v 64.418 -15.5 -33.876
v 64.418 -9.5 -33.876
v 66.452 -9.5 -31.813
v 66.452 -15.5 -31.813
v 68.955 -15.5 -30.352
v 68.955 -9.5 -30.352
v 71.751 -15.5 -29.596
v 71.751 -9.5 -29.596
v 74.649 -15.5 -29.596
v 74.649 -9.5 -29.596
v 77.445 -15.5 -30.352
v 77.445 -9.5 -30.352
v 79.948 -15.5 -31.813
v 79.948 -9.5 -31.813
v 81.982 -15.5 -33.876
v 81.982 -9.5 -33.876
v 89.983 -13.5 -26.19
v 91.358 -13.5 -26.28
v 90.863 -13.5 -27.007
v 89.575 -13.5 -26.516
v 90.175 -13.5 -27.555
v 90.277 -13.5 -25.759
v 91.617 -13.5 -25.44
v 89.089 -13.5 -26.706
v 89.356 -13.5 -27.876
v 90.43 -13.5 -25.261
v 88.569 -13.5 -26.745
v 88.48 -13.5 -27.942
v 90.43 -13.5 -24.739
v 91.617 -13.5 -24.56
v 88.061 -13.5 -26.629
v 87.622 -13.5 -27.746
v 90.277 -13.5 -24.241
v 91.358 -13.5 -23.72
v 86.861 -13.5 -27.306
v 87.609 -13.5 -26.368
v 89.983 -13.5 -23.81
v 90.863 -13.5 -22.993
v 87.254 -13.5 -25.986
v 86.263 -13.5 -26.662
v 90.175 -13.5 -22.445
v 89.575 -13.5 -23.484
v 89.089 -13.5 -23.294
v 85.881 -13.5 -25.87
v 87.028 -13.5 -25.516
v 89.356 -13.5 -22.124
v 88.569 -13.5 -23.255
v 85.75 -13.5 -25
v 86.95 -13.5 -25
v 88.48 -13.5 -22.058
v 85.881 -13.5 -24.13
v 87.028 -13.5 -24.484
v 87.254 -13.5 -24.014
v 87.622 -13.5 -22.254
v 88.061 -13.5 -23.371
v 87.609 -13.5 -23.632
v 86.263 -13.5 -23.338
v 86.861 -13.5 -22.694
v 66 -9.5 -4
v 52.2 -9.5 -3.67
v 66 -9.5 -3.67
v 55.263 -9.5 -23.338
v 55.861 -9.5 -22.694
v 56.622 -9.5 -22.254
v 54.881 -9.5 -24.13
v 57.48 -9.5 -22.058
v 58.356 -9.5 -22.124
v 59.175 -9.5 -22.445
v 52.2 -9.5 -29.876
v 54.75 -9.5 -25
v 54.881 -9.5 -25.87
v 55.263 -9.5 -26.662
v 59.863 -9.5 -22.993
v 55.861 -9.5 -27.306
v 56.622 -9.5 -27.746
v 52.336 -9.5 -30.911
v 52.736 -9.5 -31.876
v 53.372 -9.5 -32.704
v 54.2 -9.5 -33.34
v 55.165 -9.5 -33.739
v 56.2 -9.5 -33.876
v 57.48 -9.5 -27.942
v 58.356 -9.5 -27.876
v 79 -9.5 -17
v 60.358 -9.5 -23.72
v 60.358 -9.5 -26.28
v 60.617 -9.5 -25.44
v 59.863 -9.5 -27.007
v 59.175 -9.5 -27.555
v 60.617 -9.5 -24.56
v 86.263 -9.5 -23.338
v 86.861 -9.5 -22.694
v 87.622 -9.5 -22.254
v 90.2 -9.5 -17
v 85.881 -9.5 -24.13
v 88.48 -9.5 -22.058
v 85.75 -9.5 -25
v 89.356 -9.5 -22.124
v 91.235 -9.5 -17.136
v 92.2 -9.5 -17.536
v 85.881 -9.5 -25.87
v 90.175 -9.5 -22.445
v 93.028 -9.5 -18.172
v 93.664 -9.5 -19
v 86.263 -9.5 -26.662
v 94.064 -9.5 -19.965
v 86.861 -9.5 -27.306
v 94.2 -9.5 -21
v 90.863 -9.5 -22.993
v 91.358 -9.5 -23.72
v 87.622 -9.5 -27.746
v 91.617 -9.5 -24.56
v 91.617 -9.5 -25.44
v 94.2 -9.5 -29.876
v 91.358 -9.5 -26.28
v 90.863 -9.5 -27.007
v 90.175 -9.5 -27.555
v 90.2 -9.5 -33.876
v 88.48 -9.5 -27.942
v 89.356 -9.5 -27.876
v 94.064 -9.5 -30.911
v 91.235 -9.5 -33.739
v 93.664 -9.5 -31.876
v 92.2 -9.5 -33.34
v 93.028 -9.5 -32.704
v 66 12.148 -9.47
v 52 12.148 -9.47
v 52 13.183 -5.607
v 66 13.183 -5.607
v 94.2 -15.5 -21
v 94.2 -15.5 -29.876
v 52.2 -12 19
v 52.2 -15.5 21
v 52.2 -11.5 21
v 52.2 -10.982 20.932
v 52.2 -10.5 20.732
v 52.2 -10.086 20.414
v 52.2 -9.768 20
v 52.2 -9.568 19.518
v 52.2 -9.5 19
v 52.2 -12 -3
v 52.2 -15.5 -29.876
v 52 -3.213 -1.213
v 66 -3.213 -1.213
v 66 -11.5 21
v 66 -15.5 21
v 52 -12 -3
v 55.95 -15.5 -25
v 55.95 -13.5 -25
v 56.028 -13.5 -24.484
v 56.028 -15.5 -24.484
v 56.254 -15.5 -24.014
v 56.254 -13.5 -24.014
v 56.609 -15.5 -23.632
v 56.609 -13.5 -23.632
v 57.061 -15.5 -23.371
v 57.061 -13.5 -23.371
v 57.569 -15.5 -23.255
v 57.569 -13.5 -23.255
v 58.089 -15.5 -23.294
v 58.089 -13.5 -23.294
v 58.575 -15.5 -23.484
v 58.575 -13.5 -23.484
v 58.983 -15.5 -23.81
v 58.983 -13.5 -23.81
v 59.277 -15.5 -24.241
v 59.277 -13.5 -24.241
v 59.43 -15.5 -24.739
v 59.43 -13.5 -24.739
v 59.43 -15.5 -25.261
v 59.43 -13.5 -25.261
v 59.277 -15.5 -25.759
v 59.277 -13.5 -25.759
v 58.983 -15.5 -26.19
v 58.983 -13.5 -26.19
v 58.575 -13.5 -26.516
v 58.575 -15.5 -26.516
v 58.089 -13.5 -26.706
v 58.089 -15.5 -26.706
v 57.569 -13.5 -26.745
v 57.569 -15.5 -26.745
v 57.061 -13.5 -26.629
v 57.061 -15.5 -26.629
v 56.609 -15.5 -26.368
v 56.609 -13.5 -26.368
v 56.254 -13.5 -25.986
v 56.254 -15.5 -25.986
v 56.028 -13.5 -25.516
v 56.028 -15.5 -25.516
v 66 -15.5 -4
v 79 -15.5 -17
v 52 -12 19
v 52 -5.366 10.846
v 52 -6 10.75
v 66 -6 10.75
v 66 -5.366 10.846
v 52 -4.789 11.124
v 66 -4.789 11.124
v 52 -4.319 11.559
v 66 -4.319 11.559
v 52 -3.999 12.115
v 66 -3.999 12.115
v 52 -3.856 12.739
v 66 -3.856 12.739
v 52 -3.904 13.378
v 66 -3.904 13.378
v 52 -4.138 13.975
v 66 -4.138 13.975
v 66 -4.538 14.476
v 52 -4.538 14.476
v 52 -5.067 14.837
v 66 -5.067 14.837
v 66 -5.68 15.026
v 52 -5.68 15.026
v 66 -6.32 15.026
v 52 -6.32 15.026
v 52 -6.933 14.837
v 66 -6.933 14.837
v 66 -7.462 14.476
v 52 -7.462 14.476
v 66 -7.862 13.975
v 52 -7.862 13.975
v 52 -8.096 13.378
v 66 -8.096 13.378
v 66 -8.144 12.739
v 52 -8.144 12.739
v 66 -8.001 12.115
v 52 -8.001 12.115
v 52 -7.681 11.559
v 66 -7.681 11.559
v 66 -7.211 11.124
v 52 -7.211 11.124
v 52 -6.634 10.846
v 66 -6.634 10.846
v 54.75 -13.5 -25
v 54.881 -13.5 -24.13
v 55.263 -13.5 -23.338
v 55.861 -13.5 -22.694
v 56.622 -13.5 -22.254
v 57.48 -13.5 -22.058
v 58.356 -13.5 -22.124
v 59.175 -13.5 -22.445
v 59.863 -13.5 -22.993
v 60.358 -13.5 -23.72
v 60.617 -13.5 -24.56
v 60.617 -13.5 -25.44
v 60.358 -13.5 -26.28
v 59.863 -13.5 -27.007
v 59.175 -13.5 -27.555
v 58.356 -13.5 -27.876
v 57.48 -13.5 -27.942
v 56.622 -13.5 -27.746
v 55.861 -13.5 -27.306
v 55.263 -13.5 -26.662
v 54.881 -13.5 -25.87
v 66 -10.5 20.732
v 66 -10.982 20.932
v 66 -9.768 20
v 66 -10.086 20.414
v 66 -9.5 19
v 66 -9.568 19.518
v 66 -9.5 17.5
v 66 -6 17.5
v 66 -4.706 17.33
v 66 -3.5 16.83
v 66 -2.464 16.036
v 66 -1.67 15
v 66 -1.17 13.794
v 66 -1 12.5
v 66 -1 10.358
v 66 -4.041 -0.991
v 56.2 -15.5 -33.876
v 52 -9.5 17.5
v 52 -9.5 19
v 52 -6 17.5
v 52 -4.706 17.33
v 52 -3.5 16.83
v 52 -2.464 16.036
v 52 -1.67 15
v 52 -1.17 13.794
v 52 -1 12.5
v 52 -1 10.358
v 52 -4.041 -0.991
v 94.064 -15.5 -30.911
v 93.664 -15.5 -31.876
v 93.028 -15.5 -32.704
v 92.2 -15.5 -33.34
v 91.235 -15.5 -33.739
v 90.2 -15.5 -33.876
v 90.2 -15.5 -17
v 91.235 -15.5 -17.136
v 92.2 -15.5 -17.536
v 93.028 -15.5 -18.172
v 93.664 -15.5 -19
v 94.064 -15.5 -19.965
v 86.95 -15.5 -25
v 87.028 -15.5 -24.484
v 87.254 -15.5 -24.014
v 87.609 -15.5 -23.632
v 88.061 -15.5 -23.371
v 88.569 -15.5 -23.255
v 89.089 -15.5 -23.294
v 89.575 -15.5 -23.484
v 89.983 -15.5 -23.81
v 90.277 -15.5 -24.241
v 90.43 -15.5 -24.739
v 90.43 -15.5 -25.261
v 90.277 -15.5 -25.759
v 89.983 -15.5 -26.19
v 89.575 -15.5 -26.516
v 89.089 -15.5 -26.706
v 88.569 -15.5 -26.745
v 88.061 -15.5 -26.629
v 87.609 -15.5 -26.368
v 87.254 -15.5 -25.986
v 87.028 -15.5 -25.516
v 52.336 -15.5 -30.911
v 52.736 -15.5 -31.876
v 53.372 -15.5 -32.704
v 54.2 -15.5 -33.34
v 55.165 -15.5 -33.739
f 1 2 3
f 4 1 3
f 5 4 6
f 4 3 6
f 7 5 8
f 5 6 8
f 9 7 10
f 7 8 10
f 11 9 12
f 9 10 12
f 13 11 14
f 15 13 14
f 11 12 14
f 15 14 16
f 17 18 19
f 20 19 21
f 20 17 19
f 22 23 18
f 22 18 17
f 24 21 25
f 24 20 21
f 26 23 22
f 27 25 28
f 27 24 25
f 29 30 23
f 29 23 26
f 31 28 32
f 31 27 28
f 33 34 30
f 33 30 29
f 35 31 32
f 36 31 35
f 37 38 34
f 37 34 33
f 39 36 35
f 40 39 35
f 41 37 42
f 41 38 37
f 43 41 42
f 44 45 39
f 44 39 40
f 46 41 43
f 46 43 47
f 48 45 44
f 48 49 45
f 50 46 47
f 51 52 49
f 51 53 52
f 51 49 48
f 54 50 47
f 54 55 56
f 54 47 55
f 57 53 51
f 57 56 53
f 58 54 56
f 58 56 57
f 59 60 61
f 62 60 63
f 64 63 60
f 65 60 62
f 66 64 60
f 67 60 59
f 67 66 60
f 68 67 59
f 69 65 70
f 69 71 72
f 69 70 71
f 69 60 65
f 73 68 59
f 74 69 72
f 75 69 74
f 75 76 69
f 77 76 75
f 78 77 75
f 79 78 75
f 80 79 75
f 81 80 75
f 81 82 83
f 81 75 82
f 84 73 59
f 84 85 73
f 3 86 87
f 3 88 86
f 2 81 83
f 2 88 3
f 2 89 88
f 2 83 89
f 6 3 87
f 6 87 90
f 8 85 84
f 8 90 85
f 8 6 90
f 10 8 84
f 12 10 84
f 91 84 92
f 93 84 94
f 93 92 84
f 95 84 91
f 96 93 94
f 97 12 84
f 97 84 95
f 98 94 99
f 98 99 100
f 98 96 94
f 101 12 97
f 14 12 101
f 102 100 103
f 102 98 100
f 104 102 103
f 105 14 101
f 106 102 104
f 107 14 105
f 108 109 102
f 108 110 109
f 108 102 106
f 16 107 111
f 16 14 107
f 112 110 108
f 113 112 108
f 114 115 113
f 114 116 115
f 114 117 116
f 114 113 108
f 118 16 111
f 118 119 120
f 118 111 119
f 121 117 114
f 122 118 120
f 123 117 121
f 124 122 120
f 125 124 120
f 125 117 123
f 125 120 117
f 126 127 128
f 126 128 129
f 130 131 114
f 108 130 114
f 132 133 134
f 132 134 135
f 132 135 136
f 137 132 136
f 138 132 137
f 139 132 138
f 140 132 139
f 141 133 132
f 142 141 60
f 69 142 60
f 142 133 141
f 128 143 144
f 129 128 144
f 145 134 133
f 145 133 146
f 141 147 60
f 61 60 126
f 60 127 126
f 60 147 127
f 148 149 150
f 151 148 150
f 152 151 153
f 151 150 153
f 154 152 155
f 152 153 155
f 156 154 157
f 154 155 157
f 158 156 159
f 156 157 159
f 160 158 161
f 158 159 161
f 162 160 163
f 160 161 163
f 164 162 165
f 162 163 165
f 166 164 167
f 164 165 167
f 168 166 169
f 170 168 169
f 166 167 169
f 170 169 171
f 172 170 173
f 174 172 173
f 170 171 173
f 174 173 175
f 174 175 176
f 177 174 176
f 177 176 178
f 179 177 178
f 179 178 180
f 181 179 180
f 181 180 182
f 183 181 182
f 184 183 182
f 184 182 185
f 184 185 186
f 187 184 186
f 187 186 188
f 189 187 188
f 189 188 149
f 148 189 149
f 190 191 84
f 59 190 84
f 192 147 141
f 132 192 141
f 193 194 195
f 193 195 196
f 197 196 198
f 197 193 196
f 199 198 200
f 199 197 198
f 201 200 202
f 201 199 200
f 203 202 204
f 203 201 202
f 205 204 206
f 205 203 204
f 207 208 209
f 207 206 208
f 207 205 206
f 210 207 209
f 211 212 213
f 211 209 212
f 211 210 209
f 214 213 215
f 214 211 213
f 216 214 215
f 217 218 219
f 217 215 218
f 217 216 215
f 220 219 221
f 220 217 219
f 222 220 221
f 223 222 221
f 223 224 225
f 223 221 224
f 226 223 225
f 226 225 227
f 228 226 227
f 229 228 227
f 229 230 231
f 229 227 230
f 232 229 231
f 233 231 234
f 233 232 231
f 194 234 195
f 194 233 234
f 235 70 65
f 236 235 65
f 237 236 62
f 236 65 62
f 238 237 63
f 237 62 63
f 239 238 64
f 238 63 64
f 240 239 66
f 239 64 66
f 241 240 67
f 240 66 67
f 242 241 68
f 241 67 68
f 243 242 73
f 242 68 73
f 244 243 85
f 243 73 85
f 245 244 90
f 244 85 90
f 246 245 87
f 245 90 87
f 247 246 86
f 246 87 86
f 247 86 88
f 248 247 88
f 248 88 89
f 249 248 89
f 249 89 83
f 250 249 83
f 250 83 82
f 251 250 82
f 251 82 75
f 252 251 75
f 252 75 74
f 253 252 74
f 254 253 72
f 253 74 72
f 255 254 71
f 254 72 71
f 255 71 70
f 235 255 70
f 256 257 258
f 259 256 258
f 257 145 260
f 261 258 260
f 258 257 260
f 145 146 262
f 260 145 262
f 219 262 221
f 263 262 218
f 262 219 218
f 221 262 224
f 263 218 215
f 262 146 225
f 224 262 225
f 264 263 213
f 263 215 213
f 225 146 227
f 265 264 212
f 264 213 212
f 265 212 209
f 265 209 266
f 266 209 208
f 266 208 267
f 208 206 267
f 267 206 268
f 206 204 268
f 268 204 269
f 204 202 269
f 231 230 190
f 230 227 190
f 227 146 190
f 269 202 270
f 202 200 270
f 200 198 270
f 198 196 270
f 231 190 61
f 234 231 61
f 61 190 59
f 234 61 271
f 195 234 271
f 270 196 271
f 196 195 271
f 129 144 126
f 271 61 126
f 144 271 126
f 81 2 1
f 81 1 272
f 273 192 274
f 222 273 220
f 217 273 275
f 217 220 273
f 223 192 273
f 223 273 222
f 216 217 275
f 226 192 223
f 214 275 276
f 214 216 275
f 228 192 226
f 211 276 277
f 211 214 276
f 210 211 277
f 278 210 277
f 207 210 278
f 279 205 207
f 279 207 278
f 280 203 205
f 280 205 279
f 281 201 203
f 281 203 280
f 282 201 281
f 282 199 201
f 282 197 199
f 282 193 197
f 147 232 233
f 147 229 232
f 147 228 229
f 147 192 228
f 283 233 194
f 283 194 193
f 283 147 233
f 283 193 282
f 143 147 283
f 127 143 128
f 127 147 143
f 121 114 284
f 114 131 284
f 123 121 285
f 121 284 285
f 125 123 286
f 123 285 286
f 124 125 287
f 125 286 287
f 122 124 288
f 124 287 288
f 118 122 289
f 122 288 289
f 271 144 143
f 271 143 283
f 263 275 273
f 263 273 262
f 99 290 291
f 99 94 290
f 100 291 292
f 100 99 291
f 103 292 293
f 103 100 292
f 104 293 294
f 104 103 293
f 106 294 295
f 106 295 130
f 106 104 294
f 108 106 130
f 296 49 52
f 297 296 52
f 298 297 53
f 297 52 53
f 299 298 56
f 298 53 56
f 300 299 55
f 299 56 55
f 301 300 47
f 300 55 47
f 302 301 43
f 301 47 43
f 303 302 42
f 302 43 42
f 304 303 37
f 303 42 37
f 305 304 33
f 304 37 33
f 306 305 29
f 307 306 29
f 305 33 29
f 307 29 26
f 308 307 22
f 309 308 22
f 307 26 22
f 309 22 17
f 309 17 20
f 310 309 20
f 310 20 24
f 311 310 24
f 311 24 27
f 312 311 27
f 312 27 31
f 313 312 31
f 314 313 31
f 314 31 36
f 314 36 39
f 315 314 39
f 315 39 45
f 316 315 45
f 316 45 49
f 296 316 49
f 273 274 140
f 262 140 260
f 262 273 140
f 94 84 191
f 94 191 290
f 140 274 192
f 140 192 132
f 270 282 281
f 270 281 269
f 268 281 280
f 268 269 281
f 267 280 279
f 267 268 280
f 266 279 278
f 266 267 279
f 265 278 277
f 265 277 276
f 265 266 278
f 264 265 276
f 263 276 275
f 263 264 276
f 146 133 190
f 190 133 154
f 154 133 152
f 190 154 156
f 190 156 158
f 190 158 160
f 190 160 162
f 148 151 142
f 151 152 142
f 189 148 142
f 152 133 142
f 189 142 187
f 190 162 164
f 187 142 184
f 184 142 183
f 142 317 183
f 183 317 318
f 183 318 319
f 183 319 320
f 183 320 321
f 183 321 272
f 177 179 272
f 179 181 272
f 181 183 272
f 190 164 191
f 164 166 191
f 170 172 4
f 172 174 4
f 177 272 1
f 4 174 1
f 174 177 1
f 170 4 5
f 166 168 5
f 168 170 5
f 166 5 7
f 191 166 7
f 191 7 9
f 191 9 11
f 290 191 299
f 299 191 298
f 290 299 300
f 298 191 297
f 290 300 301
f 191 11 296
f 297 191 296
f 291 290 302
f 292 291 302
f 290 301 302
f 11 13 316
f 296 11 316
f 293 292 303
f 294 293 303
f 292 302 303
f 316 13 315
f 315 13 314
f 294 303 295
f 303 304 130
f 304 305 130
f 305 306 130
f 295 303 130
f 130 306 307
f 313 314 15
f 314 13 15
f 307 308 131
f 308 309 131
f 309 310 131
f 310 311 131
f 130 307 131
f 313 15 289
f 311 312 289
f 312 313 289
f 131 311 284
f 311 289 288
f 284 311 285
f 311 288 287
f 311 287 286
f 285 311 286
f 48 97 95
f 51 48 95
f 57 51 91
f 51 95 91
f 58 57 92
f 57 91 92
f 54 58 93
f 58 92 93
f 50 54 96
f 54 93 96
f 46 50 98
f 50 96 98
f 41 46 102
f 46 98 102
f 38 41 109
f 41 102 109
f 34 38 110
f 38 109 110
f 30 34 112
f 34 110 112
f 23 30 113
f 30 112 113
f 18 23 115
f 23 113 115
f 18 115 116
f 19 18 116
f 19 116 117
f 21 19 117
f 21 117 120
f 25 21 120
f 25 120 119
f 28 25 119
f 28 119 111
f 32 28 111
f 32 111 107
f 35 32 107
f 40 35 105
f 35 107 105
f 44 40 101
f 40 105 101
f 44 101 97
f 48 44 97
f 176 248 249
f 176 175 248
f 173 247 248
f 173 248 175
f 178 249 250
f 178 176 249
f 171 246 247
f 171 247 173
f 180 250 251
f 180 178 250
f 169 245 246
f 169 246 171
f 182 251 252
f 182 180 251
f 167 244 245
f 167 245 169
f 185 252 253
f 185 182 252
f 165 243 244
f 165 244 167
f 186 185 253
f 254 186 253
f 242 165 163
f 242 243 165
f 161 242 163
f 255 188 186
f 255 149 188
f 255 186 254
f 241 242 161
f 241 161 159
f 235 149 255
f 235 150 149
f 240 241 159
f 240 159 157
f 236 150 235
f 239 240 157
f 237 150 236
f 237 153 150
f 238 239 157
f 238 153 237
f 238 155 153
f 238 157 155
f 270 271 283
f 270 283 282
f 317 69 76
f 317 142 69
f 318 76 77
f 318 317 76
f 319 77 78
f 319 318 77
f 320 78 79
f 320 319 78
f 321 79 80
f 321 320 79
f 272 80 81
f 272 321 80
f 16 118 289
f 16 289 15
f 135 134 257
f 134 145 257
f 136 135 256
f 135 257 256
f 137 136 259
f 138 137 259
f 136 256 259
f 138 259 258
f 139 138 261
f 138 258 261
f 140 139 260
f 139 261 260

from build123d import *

# Parameters (mm, degrees)
CYLINDER_R           = 2.15
CYLINDER_DEPTH       = 50
CYLINDER_PITCH_ANGLE = 90
BOX002_W             = 14
BOX002_H             = 11
BOX002_DEPTH         = 20.5
CHAMFER_SIZE         = 4
FILLET001_R          = 5
BOX003_W             = 14
BOX003_H             = 25
BOX003_DEPTH         = 4
BOX003_ROLL_ANGLE    = -15
BOX004_W             = 14
BOX004_H             = 2.5
BOX004_DEPTH         = 5
POCKET006_DEPTH      = 15
BOX005003_W          = 42
BOX005003_H          = 6
BOX005003_DEPTH      = 25
SKETCH009_R          = 11
SKETCH009_R_2        = 1.75
POCKET009_DEPTH      = 6
SKETCH010_W          = 62.382877
SKETCH010_H          = 25.148186
POCKET010_DEPTH      = 6
BOX005002_W          = 13.8
BOX005002_H          = 6
BOX005002_DEPTH      = 42
CHAMFER002_SIZE      = 13
FILLET003_R          = 4
FILLET004_R          = 2
SKETCH011_R          = 2.95
POCKET011_DEPTH      = 4


with BuildPart() as cylinder:
    # Cylinder → Cylinder (new body)
    with BuildSketch(Plane.XY):
        Circle(CYLINDER_R)
    extrude(amount=CYLINDER_DEPTH)


with BuildPart() as cylinder_1:
    # Cylinder pitch: moved
    add(cylinder.part.rotate(Axis((0, 0, 0), (0, 1, 0)), CYLINDER_PITCH_ANGLE))


with BuildPart() as cylinder_2:
    # Cylinder placement: moved
    add(cylinder_1.part.moved(Location((31, -6, 12.9))))


with BuildPart() as fillet001:
    # Box002 → Box002 (new body)
    with BuildSketch(Plane(origin=(52, -12, -3), x_dir=(1, 0, 0), z_dir=(0, 0, 1))):
        with Locations((7, 5.5)):
            Rectangle(BOX002_W, BOX002_H)
    extrude(amount=BOX002_DEPTH)

    # Chamfer
    chamfer_edges = [fillet001.edges().sort_by_distance(p)[0] for p in [
        (59, -1, -3),
    ]]
    chamfer(chamfer_edges, length=CHAMFER_SIZE)

    # Fillet001
    fillet001_edges = [fillet001.edges().sort_by_distance(p)[0] for p in [
        (59, -1, 17.5),
    ]]
    fillet(fillet001_edges, radius=FILLET001_R)


with BuildPart() as cube002:
    # Box003 → Box003 (new body)
    with BuildSketch(Plane.XY):
        with Locations((7, 12.5)):
            Rectangle(BOX003_W, BOX003_H)
    extrude(amount=BOX003_DEPTH)


with BuildPart() as cube002_1:
    # Box003 roll: moved
    add(cube002.part.rotate(Axis((0, 0, 0), (1, 0, 0)), BOX003_ROLL_ANGLE))


with BuildPart() as cube002_2:
    # Box003 placement: moved
    add(cube002_1.part.moved(Location((52, -12, -3))))


with BuildPart() as clone_of_enganche002:
    # Box004 → Box004 (new body)
    with BuildSketch(Plane(origin=(52, -12, 14), x_dir=(1, 0, 0), z_dir=(0, 0, 1))):
        with Locations((7, 1.25)):
            Rectangle(BOX004_W, BOX004_H)
    extrude(amount=BOX004_DEPTH)

    # Fusion: union Fillet001, Cube002
    add(fillet001.part)
    add(cube002_2.part)

    # Cut001: cut Cylinder
    add(cylinder_2.part, mode=Mode.SUBTRACT)

    # Sketch006 → Pocket006 (cut)
    with BuildSketch(Plane.YZ.offset(66)):
        Polygon((13.183422, -5.606773), (-4.041064, -0.991486), (-0.407217, 12.570217), align=None)
    extrude(amount=-POCKET006_DEPTH, mode=Mode.SUBTRACT)


with BuildPart() as pocket010:
    # Box005003 → Box005003 (new body)
    with BuildSketch(Plane(origin=(52.2, -15.5, -42), x_dir=(1, 0, 0), z_dir=(0, 0, 1))):
        with Locations((21, 3)):
            Rectangle(BOX005003_W, BOX005003_H)
    extrude(amount=BOX005003_DEPTH)

    # Sketch009 → Pocket009 (cut)
    with BuildSketch(Plane(origin=(52.2, -9.5, -42), x_dir=(-1, 0, 0), z_dir=(0, 1, 0))):
        with Locations((-21, 1.5)):
            Circle(SKETCH009_R)
        with Locations((-36.5, 17)):
            Circle(SKETCH009_R_2)
        with Locations((-5.5, 17)):
            Circle(SKETCH009_R_2)
    extrude(amount=-POCKET009_DEPTH, mode=Mode.SUBTRACT)

    # Sketch010 → Pocket010 (cut)
    with BuildSketch(Plane(origin=(52.2, -9.5, -42), x_dir=(-1, 0, 0), z_dir=(0, 1, 0))):
        with Locations((-19.46246, -4.449775)):
            Rectangle(SKETCH010_W, SKETCH010_H)
    extrude(amount=-POCKET010_DEPTH, mode=Mode.SUBTRACT)


with BuildPart() as pocket011:
    # Box005002 → Box005002 (new body)
    with BuildSketch(Plane(origin=(52.2, -15.5, -21), x_dir=(1, 0, 0), z_dir=(0, 0, 1))):
        with Locations((6.9, 3)):
            Rectangle(BOX005002_W, BOX005002_H)
    extrude(amount=BOX005002_DEPTH)

    # Fusion005: union Clone of Enganche002, Pocket010
    add(clone_of_enganche002.part)
    add(pocket010.part)

    # Chamfer002
    chamfer002_edges = [pocket011.edges().sort_by_distance(p)[0] for p in [
        (66, -12.5, -17),
    ]]
    chamfer(chamfer002_edges, length=CHAMFER002_SIZE)

    # Fillet003
    fillet003_edges = [pocket011.edges().sort_by_distance(p)[0] for p in [
        (94.2, -12.5, -17),
        (94.2, -12.5, -33.875682),
        (52.2, -12.5, -33.875682),
    ]]
    fillet(fillet003_edges, radius=FILLET003_R)

    # Fillet004
    fillet004_edges = [pocket011.edges().sort_by_distance(p)[0] for p in [
        (59.1, -9.5, 21),
    ]]
    fillet(fillet004_edges, radius=FILLET004_R)

    # Sketch011 → Pocket011 (cut)
    with BuildSketch(Plane(origin=(0, -9.5, 0), x_dir=(-1, 0, 0), z_dir=(0, 1, 0))):
        with Locations((-88.7, -25)):
            Circle(SKETCH011_R)
        with Locations((-57.7, -25)):
            Circle(SKETCH011_R)
    extrude(amount=-POCKET011_DEPTH, mode=Mode.SUBTRACT)


solid = pocket011.part
